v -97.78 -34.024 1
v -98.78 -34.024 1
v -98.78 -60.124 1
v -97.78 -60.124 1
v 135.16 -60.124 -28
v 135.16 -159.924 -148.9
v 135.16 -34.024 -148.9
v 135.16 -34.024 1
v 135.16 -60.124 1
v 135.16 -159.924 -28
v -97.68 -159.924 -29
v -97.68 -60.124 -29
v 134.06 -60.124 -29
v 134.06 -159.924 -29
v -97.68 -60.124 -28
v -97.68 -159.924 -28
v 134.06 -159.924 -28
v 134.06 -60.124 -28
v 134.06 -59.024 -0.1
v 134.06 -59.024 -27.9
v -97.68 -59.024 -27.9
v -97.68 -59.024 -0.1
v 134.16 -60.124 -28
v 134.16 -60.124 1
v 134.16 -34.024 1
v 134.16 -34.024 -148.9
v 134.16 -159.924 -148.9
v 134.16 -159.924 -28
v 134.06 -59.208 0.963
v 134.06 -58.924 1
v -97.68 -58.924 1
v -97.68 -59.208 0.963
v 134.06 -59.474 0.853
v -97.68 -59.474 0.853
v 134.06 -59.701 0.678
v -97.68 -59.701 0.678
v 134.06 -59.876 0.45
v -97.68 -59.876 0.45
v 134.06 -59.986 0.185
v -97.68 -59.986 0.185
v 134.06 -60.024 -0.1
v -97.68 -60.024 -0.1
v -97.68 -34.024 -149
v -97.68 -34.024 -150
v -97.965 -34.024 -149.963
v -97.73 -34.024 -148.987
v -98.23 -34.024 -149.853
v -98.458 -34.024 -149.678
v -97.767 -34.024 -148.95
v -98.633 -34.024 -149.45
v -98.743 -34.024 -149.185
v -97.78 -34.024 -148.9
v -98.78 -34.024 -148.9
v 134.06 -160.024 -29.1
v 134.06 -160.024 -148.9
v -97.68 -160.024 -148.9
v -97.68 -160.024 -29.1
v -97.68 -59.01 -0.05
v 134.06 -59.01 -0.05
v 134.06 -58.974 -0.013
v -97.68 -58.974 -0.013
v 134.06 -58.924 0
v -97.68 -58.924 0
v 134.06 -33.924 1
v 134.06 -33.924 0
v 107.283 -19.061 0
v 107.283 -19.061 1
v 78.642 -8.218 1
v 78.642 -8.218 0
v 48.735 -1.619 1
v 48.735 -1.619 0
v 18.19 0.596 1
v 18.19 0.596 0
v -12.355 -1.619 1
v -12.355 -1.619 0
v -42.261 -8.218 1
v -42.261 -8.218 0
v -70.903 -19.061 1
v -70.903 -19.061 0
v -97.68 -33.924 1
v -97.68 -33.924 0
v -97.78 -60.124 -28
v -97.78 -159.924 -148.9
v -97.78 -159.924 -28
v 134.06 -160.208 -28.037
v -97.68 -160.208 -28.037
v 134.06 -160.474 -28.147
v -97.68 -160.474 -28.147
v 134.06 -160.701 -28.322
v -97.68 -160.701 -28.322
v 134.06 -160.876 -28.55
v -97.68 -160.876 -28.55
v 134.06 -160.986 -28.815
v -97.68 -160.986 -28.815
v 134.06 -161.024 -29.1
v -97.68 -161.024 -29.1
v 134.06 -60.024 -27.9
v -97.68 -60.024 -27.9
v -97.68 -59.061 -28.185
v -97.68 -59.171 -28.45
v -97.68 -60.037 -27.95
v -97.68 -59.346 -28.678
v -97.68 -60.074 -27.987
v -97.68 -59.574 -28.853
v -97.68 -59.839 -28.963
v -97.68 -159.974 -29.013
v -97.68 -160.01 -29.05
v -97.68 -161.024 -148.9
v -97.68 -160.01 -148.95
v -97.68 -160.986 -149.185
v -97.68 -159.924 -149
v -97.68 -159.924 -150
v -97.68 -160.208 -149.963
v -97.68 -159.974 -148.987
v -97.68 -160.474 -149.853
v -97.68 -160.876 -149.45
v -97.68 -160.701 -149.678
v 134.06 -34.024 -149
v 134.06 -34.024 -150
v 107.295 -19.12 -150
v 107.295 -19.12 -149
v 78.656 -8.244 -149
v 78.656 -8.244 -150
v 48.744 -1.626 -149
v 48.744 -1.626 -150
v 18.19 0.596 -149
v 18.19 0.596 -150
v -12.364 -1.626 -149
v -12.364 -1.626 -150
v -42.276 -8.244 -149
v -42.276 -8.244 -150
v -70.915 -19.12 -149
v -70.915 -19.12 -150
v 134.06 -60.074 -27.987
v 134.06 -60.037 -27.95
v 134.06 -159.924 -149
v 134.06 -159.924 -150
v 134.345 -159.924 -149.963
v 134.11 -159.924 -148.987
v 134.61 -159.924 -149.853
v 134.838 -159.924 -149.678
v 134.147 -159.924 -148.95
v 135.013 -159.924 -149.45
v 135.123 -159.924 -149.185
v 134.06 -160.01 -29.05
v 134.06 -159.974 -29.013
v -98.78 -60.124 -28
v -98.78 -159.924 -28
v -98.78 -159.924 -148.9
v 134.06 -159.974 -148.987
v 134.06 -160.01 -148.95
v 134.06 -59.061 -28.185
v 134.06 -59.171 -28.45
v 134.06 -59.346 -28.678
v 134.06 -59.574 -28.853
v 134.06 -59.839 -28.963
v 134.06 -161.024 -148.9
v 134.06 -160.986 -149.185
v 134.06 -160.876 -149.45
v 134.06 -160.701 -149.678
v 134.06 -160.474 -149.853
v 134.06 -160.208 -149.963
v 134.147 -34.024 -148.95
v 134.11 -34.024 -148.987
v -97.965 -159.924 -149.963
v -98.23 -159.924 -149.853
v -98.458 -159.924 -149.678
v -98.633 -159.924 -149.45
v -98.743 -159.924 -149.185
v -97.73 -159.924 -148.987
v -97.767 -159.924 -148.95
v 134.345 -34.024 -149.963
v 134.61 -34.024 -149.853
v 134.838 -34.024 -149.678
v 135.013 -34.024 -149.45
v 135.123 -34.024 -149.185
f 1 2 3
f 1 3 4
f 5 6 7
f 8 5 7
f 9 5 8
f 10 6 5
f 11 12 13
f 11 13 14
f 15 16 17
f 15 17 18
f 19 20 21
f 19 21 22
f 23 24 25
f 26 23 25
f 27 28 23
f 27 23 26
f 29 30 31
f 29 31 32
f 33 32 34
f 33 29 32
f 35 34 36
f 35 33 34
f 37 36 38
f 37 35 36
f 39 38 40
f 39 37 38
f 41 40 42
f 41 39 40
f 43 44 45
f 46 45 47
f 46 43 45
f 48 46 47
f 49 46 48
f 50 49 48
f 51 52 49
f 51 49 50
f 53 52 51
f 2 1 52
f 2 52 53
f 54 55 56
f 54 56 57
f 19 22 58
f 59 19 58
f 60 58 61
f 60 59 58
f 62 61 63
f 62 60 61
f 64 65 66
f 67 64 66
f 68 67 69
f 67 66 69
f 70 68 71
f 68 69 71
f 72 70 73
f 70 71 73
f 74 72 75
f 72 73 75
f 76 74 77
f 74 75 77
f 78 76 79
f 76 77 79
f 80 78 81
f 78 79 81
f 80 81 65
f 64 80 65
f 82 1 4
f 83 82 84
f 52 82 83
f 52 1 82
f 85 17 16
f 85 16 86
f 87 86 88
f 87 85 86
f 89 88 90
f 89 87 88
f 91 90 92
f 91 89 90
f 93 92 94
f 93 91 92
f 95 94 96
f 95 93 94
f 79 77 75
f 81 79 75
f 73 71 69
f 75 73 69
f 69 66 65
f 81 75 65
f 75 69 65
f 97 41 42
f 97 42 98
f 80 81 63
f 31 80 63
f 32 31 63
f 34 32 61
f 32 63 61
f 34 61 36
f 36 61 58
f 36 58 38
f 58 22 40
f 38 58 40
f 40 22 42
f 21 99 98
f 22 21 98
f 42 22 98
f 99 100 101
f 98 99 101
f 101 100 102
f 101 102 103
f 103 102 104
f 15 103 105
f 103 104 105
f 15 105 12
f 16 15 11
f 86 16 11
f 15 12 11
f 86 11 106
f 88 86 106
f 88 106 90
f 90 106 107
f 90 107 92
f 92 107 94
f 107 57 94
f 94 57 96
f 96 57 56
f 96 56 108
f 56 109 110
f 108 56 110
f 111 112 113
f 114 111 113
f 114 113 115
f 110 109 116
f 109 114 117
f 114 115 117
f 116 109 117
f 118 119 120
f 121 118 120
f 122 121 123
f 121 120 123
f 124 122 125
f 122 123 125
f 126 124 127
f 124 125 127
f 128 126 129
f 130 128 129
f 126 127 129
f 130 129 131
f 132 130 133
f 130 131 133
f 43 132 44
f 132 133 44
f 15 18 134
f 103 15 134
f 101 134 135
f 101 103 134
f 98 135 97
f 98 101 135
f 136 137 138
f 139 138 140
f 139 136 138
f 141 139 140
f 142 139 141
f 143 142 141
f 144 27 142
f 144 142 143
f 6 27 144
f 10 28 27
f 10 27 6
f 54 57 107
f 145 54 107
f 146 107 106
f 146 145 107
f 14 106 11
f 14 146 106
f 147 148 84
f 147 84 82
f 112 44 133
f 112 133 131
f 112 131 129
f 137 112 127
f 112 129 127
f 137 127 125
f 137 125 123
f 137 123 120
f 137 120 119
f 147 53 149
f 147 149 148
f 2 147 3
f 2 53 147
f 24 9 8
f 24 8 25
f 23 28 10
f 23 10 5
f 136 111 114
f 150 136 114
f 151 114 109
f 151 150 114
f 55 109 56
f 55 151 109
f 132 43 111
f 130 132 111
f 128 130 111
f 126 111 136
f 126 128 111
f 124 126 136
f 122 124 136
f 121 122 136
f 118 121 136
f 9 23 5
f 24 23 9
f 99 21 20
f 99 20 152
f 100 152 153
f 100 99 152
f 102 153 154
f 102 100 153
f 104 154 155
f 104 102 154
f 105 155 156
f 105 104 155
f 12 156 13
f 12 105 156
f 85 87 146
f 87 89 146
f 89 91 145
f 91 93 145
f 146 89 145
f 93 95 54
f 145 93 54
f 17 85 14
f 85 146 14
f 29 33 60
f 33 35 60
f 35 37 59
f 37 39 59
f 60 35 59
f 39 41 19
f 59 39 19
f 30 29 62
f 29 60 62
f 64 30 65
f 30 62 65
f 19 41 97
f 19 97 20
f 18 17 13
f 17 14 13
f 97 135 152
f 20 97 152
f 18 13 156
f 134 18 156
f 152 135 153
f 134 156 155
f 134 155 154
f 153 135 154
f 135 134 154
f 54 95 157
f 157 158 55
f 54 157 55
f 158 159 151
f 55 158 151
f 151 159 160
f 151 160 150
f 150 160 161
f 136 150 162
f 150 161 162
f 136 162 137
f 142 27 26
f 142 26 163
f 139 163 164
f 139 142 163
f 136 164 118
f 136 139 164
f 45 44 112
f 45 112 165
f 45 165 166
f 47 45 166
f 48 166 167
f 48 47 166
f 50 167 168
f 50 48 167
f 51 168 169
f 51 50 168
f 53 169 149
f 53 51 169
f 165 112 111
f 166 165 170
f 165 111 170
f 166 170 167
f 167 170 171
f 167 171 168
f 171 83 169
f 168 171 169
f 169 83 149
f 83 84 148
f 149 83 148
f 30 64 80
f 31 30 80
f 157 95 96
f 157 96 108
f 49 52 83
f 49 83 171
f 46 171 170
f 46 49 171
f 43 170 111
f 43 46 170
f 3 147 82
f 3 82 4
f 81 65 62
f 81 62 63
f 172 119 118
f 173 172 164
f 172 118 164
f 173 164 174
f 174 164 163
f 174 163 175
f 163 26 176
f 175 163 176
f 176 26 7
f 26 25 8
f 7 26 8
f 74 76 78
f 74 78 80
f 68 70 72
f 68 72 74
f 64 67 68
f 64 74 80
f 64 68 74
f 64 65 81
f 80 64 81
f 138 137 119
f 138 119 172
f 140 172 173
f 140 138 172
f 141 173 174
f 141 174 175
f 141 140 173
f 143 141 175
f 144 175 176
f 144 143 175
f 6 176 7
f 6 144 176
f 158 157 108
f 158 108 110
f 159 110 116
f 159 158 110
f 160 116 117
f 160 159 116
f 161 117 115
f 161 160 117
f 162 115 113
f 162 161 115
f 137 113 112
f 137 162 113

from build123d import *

# Parameters (mm, degrees)
EXTRUDE_1_DEPTH                  = 1
SKETCH_5_W                       = 231.74052668
SKETCH_5_H                       = 25
SM_BASE_FLANGE_1_DEPTH           = 1
SM_EDGE_FLANGE_1_DEPTH           = 231.74052668
SM_EDGE_FLANGE_2_STRIP_W         = 4.2
SM_EDGE_FLANGE_2_STRIP_H         = 1
SM_EDGE_FLANGE_2_STRIP_CUT_DEPTH = 231.74052668
SM_EDGE_FLANGE_2_DEPTH           = 231.74052668
SM_EDGE_FLANGE_3_STRIP_W         = 4.2
SM_EDGE_FLANGE_3_STRIP_H         = 1
SM_EDGE_FLANGE_3_STRIP_CUT_DEPTH = 231.74052668
SM_EDGE_FLANGE_3_DEPTH           = 231.74052668
SM_EDGE_FLANGE_4_STRIP_W         = 4.2
SM_EDGE_FLANGE_4_STRIP_H         = 1
SM_EDGE_FLANGE_4_STRIP_CUT_DEPTH = 231.74052668
SM_EDGE_FLANGE_4_DEPTH           = 231.74052668
SM_START                         = -1
SM_EDGE_FLANGE_4_FLAT_DEPTH      = 1
SM_EDGE_FLANGE_5_DEPTH           = 125.9
SM_EDGE_FLANGE_6_DEPTH           = 125.9
SKETCH_33_W                      = 29
SKETCH_33_H                      = 99.8
CUT_EXTRUDE_4_DEPTH              = 322.180288583


# Sheet-metal steps are written as plain solids
with BuildPart() as part:
    # Sketch 1 → Вытянуть1 (new body)
    with BuildSketch(Plane.XY):
        with BuildLine():
            Line((-97.680090168, -33.923624823), (134.060436512, -33.923624823))
            ThreePointArc((134.060436512, -33.923624823), (18.190173172, 0.595554476), (-97.680090168, -33.923624823))
        make_face()
    extrude(amount=EXTRUDE_1_DEPTH)


with BuildPart() as body_2:
    # Эскиз5 → Базовая кромка1 (new body)
    with BuildSketch(Plane(origin=(0, 0, 0), x_dir=(-1, 0, 0), z_dir=(0, 0, -1))):
        with Locations((-18.190173172, -46.423624823)):
            Rectangle(SKETCH_5_W, SKETCH_5_H)
    extrude(amount=-SM_BASE_FLANGE_1_DEPTH)

    # Ребро-кромка1 section (across the edge) → Ребро-кромка1 (add)
    with BuildSketch(Plane(origin=(134.060436512, -59.023624823, 0), x_dir=(0, 1, 0), z_dir=(-1, 0, 0))):
        with BuildLine():
            Line((-1, 0.1), (-1, 28))
            Line((-1, 28), (0, 28))
            Line((0, 28), (0, 0.1))
            ThreePointArc((0, 0.1), (0.029289322, 0.029289322), (0.1, 0))
            Line((0.1, 0), (0.1, -1))
            ThreePointArc((0.1, -1), (-0.677817459, -0.677817459), (-1, 0.1))
        make_face()
    extrude(amount=SM_EDGE_FLANGE_1_DEPTH)

    # Ребро-кромка2 strip (across the edge) → Ребро-кромка2 strip cut (cut)
    with BuildSketch(Plane(origin=(-97.680090168, -60.023624823, -28), x_dir=(0, 0, 1), z_dir=(1, 0, 0))):
        with Locations((-2, -0.5)):
            Rectangle(SM_EDGE_FLANGE_2_STRIP_W, SM_EDGE_FLANGE_2_STRIP_H)
    extrude(amount=SM_EDGE_FLANGE_2_STRIP_CUT_DEPTH, mode=Mode.SUBTRACT)

    # Ребро-кромка2 section (across the edge) → Ребро-кромка2 (add)
    with BuildSketch(Plane(origin=(-97.680090168, -60.023624823, -28), x_dir=(0, 0, 1), z_dir=(1, 0, 0))):
        with BuildLine():
            Line((-1, 0.1), (-1, 100))
            Line((-1, 100), (0, 100))
            Line((0, 100), (0, 0.1))
            ThreePointArc((0, 0.1), (0.029289322, 0.029289322), (0.1, 0))
            Line((0.1, 0), (0.1, -1))
            ThreePointArc((0.1, -1), (-0.677817459, -0.677817459), (-1, 0.1))
        make_face()
    extrude(amount=SM_EDGE_FLANGE_2_DEPTH)

    # Ребро-кромка3 strip (across the edge) → Ребро-кромка3 strip cut (cut)
    with BuildSketch(Plane(origin=(134.060436512, -160.023624823, -29), x_dir=(0, 1, 0), z_dir=(-1, 0, 0))):
        with Locations((-2, -0.5)):
            Rectangle(SM_EDGE_FLANGE_3_STRIP_W, SM_EDGE_FLANGE_3_STRIP_H)
    extrude(amount=SM_EDGE_FLANGE_3_STRIP_CUT_DEPTH, mode=Mode.SUBTRACT)

    # Ребро-кромка3 section (across the edge) → Ребро-кромка3 (add)
    with BuildSketch(Plane(origin=(134.060436512, -160.023624823, -29), x_dir=(0, 1, 0), z_dir=(-1, 0, 0))):
        with BuildLine():
            Line((-1, 0.1), (-1, 120))
            Line((-1, 120), (0, 120))
            Line((0, 120), (0, 0.1))
            ThreePointArc((0, 0.1), (0.029289322, 0.029289322), (0.1, 0))
            Line((0.1, 0), (0.1, -1))
            ThreePointArc((0.1, -1), (-0.677817459, -0.677817459), (-1, 0.1))
        make_face()
    extrude(amount=SM_EDGE_FLANGE_3_DEPTH)

    # Ребро-кромка4 strip (across the edge) → Ребро-кромка4 strip cut (cut)
    with BuildSketch(Plane(origin=(134.060436512, -160.023624823, -149), x_dir=(0, 0, 1), z_dir=(-1, 0, 0))):
        with Locations((-2, -0.5)):
            Rectangle(SM_EDGE_FLANGE_4_STRIP_W, SM_EDGE_FLANGE_4_STRIP_H)
    extrude(amount=SM_EDGE_FLANGE_4_STRIP_CUT_DEPTH, mode=Mode.SUBTRACT)

    # Ребро-кромка4 bend section (across the edge) → Ребро-кромка4 (add)
    with BuildSketch(Plane(origin=(134.060436512, -160.023624823, -149), x_dir=(0, 0, 1), z_dir=(-1, 0, 0))):
        with BuildLine():
            Line((-1, 0.1), (0, 0.1))
            ThreePointArc((0, 0.1), (0.029289322, 0.029289322), (0.1, 0))
            Line((0.1, 0), (0.1, -1))
            ThreePointArc((0.1, -1), (-0.677817459, -0.677817459), (-1, 0.1))
        make_face()
    extrude(amount=SM_EDGE_FLANGE_4_DEPTH)

    # Ребро-кромка4 profile (on flange) → Ребро-кромка4 flat (add)
    with BuildSketch(Plane(origin=(0, -160.023624823, -149), x_dir=(1, 0, 0), z_dir=(0, 0, 1)).offset(SM_START)):
        with BuildLine():
            ThreePointArc((134.060436512, 126), (18.190173172, 160.619179382), (-97.680090168, 126))
            Line((-97.680090168, 126), (-97.680090168, 0.1))
            Line((-97.680090168, 0.1), (134.060436512, 0.1))
            Line((134.060436512, 0.1), (134.060436512, 126))
        make_face()
    extrude(amount=SM_EDGE_FLANGE_4_FLAT_DEPTH)

    # Ребро-кромка5 section (across the edge) → Ребро-кромка5 (add)
    with BuildSketch(Plane(origin=(-97.780090168, -34.023624823, -149), x_dir=(1, 0, 0), z_dir=(0, -1, 0))):
        with BuildLine():
            Line((-1, 0.1), (-1, 150))
            Line((-1, 150), (0, 150))
            Line((0, 150), (0, 0.1))
            ThreePointArc((0, 0.1), (0.029289322, 0.029289322), (0.1, 0))
            Line((0.1, 0), (0.1, -1))
            ThreePointArc((0.1, -1), (-0.677817459, -0.677817459), (-1, 0.1))
        make_face()
    extrude(amount=SM_EDGE_FLANGE_5_DEPTH)

    # Ребро-кромка6 section (across the edge) → Ребро-кромка6 (add)
    with BuildSketch(Plane(origin=(134.160436512, -159.923624823, -149), x_dir=(-1, 0, 0), z_dir=(0, 1, 0))):
        with BuildLine():
            Line((-1, 0.1), (-1, 150))
            Line((-1, 150), (0, 150))
            Line((0, 150), (0, 0.1))
            ThreePointArc((0, 0.1), (0.029289322, 0.029289322), (0.1, 0))
            Line((0.1, 0), (0.1, -1))
            ThreePointArc((0.1, -1), (-0.677817459, -0.677817459), (-1, 0.1))
        make_face()
    extrude(amount=SM_EDGE_FLANGE_6_DEPTH)

    # Эскиз33 → Вытянуть4 (cut, through all)
    with BuildSketch(Plane.ZY.offset(98.780090168)):
        with Locations((-13.5, -110.023624823)):
            Rectangle(SKETCH_33_W, SKETCH_33_H)
    extrude(amount=-CUT_EXTRUDE_4_DEPTH, mode=Mode.SUBTRACT)


solid = Compound([part.part, body_2.part])
